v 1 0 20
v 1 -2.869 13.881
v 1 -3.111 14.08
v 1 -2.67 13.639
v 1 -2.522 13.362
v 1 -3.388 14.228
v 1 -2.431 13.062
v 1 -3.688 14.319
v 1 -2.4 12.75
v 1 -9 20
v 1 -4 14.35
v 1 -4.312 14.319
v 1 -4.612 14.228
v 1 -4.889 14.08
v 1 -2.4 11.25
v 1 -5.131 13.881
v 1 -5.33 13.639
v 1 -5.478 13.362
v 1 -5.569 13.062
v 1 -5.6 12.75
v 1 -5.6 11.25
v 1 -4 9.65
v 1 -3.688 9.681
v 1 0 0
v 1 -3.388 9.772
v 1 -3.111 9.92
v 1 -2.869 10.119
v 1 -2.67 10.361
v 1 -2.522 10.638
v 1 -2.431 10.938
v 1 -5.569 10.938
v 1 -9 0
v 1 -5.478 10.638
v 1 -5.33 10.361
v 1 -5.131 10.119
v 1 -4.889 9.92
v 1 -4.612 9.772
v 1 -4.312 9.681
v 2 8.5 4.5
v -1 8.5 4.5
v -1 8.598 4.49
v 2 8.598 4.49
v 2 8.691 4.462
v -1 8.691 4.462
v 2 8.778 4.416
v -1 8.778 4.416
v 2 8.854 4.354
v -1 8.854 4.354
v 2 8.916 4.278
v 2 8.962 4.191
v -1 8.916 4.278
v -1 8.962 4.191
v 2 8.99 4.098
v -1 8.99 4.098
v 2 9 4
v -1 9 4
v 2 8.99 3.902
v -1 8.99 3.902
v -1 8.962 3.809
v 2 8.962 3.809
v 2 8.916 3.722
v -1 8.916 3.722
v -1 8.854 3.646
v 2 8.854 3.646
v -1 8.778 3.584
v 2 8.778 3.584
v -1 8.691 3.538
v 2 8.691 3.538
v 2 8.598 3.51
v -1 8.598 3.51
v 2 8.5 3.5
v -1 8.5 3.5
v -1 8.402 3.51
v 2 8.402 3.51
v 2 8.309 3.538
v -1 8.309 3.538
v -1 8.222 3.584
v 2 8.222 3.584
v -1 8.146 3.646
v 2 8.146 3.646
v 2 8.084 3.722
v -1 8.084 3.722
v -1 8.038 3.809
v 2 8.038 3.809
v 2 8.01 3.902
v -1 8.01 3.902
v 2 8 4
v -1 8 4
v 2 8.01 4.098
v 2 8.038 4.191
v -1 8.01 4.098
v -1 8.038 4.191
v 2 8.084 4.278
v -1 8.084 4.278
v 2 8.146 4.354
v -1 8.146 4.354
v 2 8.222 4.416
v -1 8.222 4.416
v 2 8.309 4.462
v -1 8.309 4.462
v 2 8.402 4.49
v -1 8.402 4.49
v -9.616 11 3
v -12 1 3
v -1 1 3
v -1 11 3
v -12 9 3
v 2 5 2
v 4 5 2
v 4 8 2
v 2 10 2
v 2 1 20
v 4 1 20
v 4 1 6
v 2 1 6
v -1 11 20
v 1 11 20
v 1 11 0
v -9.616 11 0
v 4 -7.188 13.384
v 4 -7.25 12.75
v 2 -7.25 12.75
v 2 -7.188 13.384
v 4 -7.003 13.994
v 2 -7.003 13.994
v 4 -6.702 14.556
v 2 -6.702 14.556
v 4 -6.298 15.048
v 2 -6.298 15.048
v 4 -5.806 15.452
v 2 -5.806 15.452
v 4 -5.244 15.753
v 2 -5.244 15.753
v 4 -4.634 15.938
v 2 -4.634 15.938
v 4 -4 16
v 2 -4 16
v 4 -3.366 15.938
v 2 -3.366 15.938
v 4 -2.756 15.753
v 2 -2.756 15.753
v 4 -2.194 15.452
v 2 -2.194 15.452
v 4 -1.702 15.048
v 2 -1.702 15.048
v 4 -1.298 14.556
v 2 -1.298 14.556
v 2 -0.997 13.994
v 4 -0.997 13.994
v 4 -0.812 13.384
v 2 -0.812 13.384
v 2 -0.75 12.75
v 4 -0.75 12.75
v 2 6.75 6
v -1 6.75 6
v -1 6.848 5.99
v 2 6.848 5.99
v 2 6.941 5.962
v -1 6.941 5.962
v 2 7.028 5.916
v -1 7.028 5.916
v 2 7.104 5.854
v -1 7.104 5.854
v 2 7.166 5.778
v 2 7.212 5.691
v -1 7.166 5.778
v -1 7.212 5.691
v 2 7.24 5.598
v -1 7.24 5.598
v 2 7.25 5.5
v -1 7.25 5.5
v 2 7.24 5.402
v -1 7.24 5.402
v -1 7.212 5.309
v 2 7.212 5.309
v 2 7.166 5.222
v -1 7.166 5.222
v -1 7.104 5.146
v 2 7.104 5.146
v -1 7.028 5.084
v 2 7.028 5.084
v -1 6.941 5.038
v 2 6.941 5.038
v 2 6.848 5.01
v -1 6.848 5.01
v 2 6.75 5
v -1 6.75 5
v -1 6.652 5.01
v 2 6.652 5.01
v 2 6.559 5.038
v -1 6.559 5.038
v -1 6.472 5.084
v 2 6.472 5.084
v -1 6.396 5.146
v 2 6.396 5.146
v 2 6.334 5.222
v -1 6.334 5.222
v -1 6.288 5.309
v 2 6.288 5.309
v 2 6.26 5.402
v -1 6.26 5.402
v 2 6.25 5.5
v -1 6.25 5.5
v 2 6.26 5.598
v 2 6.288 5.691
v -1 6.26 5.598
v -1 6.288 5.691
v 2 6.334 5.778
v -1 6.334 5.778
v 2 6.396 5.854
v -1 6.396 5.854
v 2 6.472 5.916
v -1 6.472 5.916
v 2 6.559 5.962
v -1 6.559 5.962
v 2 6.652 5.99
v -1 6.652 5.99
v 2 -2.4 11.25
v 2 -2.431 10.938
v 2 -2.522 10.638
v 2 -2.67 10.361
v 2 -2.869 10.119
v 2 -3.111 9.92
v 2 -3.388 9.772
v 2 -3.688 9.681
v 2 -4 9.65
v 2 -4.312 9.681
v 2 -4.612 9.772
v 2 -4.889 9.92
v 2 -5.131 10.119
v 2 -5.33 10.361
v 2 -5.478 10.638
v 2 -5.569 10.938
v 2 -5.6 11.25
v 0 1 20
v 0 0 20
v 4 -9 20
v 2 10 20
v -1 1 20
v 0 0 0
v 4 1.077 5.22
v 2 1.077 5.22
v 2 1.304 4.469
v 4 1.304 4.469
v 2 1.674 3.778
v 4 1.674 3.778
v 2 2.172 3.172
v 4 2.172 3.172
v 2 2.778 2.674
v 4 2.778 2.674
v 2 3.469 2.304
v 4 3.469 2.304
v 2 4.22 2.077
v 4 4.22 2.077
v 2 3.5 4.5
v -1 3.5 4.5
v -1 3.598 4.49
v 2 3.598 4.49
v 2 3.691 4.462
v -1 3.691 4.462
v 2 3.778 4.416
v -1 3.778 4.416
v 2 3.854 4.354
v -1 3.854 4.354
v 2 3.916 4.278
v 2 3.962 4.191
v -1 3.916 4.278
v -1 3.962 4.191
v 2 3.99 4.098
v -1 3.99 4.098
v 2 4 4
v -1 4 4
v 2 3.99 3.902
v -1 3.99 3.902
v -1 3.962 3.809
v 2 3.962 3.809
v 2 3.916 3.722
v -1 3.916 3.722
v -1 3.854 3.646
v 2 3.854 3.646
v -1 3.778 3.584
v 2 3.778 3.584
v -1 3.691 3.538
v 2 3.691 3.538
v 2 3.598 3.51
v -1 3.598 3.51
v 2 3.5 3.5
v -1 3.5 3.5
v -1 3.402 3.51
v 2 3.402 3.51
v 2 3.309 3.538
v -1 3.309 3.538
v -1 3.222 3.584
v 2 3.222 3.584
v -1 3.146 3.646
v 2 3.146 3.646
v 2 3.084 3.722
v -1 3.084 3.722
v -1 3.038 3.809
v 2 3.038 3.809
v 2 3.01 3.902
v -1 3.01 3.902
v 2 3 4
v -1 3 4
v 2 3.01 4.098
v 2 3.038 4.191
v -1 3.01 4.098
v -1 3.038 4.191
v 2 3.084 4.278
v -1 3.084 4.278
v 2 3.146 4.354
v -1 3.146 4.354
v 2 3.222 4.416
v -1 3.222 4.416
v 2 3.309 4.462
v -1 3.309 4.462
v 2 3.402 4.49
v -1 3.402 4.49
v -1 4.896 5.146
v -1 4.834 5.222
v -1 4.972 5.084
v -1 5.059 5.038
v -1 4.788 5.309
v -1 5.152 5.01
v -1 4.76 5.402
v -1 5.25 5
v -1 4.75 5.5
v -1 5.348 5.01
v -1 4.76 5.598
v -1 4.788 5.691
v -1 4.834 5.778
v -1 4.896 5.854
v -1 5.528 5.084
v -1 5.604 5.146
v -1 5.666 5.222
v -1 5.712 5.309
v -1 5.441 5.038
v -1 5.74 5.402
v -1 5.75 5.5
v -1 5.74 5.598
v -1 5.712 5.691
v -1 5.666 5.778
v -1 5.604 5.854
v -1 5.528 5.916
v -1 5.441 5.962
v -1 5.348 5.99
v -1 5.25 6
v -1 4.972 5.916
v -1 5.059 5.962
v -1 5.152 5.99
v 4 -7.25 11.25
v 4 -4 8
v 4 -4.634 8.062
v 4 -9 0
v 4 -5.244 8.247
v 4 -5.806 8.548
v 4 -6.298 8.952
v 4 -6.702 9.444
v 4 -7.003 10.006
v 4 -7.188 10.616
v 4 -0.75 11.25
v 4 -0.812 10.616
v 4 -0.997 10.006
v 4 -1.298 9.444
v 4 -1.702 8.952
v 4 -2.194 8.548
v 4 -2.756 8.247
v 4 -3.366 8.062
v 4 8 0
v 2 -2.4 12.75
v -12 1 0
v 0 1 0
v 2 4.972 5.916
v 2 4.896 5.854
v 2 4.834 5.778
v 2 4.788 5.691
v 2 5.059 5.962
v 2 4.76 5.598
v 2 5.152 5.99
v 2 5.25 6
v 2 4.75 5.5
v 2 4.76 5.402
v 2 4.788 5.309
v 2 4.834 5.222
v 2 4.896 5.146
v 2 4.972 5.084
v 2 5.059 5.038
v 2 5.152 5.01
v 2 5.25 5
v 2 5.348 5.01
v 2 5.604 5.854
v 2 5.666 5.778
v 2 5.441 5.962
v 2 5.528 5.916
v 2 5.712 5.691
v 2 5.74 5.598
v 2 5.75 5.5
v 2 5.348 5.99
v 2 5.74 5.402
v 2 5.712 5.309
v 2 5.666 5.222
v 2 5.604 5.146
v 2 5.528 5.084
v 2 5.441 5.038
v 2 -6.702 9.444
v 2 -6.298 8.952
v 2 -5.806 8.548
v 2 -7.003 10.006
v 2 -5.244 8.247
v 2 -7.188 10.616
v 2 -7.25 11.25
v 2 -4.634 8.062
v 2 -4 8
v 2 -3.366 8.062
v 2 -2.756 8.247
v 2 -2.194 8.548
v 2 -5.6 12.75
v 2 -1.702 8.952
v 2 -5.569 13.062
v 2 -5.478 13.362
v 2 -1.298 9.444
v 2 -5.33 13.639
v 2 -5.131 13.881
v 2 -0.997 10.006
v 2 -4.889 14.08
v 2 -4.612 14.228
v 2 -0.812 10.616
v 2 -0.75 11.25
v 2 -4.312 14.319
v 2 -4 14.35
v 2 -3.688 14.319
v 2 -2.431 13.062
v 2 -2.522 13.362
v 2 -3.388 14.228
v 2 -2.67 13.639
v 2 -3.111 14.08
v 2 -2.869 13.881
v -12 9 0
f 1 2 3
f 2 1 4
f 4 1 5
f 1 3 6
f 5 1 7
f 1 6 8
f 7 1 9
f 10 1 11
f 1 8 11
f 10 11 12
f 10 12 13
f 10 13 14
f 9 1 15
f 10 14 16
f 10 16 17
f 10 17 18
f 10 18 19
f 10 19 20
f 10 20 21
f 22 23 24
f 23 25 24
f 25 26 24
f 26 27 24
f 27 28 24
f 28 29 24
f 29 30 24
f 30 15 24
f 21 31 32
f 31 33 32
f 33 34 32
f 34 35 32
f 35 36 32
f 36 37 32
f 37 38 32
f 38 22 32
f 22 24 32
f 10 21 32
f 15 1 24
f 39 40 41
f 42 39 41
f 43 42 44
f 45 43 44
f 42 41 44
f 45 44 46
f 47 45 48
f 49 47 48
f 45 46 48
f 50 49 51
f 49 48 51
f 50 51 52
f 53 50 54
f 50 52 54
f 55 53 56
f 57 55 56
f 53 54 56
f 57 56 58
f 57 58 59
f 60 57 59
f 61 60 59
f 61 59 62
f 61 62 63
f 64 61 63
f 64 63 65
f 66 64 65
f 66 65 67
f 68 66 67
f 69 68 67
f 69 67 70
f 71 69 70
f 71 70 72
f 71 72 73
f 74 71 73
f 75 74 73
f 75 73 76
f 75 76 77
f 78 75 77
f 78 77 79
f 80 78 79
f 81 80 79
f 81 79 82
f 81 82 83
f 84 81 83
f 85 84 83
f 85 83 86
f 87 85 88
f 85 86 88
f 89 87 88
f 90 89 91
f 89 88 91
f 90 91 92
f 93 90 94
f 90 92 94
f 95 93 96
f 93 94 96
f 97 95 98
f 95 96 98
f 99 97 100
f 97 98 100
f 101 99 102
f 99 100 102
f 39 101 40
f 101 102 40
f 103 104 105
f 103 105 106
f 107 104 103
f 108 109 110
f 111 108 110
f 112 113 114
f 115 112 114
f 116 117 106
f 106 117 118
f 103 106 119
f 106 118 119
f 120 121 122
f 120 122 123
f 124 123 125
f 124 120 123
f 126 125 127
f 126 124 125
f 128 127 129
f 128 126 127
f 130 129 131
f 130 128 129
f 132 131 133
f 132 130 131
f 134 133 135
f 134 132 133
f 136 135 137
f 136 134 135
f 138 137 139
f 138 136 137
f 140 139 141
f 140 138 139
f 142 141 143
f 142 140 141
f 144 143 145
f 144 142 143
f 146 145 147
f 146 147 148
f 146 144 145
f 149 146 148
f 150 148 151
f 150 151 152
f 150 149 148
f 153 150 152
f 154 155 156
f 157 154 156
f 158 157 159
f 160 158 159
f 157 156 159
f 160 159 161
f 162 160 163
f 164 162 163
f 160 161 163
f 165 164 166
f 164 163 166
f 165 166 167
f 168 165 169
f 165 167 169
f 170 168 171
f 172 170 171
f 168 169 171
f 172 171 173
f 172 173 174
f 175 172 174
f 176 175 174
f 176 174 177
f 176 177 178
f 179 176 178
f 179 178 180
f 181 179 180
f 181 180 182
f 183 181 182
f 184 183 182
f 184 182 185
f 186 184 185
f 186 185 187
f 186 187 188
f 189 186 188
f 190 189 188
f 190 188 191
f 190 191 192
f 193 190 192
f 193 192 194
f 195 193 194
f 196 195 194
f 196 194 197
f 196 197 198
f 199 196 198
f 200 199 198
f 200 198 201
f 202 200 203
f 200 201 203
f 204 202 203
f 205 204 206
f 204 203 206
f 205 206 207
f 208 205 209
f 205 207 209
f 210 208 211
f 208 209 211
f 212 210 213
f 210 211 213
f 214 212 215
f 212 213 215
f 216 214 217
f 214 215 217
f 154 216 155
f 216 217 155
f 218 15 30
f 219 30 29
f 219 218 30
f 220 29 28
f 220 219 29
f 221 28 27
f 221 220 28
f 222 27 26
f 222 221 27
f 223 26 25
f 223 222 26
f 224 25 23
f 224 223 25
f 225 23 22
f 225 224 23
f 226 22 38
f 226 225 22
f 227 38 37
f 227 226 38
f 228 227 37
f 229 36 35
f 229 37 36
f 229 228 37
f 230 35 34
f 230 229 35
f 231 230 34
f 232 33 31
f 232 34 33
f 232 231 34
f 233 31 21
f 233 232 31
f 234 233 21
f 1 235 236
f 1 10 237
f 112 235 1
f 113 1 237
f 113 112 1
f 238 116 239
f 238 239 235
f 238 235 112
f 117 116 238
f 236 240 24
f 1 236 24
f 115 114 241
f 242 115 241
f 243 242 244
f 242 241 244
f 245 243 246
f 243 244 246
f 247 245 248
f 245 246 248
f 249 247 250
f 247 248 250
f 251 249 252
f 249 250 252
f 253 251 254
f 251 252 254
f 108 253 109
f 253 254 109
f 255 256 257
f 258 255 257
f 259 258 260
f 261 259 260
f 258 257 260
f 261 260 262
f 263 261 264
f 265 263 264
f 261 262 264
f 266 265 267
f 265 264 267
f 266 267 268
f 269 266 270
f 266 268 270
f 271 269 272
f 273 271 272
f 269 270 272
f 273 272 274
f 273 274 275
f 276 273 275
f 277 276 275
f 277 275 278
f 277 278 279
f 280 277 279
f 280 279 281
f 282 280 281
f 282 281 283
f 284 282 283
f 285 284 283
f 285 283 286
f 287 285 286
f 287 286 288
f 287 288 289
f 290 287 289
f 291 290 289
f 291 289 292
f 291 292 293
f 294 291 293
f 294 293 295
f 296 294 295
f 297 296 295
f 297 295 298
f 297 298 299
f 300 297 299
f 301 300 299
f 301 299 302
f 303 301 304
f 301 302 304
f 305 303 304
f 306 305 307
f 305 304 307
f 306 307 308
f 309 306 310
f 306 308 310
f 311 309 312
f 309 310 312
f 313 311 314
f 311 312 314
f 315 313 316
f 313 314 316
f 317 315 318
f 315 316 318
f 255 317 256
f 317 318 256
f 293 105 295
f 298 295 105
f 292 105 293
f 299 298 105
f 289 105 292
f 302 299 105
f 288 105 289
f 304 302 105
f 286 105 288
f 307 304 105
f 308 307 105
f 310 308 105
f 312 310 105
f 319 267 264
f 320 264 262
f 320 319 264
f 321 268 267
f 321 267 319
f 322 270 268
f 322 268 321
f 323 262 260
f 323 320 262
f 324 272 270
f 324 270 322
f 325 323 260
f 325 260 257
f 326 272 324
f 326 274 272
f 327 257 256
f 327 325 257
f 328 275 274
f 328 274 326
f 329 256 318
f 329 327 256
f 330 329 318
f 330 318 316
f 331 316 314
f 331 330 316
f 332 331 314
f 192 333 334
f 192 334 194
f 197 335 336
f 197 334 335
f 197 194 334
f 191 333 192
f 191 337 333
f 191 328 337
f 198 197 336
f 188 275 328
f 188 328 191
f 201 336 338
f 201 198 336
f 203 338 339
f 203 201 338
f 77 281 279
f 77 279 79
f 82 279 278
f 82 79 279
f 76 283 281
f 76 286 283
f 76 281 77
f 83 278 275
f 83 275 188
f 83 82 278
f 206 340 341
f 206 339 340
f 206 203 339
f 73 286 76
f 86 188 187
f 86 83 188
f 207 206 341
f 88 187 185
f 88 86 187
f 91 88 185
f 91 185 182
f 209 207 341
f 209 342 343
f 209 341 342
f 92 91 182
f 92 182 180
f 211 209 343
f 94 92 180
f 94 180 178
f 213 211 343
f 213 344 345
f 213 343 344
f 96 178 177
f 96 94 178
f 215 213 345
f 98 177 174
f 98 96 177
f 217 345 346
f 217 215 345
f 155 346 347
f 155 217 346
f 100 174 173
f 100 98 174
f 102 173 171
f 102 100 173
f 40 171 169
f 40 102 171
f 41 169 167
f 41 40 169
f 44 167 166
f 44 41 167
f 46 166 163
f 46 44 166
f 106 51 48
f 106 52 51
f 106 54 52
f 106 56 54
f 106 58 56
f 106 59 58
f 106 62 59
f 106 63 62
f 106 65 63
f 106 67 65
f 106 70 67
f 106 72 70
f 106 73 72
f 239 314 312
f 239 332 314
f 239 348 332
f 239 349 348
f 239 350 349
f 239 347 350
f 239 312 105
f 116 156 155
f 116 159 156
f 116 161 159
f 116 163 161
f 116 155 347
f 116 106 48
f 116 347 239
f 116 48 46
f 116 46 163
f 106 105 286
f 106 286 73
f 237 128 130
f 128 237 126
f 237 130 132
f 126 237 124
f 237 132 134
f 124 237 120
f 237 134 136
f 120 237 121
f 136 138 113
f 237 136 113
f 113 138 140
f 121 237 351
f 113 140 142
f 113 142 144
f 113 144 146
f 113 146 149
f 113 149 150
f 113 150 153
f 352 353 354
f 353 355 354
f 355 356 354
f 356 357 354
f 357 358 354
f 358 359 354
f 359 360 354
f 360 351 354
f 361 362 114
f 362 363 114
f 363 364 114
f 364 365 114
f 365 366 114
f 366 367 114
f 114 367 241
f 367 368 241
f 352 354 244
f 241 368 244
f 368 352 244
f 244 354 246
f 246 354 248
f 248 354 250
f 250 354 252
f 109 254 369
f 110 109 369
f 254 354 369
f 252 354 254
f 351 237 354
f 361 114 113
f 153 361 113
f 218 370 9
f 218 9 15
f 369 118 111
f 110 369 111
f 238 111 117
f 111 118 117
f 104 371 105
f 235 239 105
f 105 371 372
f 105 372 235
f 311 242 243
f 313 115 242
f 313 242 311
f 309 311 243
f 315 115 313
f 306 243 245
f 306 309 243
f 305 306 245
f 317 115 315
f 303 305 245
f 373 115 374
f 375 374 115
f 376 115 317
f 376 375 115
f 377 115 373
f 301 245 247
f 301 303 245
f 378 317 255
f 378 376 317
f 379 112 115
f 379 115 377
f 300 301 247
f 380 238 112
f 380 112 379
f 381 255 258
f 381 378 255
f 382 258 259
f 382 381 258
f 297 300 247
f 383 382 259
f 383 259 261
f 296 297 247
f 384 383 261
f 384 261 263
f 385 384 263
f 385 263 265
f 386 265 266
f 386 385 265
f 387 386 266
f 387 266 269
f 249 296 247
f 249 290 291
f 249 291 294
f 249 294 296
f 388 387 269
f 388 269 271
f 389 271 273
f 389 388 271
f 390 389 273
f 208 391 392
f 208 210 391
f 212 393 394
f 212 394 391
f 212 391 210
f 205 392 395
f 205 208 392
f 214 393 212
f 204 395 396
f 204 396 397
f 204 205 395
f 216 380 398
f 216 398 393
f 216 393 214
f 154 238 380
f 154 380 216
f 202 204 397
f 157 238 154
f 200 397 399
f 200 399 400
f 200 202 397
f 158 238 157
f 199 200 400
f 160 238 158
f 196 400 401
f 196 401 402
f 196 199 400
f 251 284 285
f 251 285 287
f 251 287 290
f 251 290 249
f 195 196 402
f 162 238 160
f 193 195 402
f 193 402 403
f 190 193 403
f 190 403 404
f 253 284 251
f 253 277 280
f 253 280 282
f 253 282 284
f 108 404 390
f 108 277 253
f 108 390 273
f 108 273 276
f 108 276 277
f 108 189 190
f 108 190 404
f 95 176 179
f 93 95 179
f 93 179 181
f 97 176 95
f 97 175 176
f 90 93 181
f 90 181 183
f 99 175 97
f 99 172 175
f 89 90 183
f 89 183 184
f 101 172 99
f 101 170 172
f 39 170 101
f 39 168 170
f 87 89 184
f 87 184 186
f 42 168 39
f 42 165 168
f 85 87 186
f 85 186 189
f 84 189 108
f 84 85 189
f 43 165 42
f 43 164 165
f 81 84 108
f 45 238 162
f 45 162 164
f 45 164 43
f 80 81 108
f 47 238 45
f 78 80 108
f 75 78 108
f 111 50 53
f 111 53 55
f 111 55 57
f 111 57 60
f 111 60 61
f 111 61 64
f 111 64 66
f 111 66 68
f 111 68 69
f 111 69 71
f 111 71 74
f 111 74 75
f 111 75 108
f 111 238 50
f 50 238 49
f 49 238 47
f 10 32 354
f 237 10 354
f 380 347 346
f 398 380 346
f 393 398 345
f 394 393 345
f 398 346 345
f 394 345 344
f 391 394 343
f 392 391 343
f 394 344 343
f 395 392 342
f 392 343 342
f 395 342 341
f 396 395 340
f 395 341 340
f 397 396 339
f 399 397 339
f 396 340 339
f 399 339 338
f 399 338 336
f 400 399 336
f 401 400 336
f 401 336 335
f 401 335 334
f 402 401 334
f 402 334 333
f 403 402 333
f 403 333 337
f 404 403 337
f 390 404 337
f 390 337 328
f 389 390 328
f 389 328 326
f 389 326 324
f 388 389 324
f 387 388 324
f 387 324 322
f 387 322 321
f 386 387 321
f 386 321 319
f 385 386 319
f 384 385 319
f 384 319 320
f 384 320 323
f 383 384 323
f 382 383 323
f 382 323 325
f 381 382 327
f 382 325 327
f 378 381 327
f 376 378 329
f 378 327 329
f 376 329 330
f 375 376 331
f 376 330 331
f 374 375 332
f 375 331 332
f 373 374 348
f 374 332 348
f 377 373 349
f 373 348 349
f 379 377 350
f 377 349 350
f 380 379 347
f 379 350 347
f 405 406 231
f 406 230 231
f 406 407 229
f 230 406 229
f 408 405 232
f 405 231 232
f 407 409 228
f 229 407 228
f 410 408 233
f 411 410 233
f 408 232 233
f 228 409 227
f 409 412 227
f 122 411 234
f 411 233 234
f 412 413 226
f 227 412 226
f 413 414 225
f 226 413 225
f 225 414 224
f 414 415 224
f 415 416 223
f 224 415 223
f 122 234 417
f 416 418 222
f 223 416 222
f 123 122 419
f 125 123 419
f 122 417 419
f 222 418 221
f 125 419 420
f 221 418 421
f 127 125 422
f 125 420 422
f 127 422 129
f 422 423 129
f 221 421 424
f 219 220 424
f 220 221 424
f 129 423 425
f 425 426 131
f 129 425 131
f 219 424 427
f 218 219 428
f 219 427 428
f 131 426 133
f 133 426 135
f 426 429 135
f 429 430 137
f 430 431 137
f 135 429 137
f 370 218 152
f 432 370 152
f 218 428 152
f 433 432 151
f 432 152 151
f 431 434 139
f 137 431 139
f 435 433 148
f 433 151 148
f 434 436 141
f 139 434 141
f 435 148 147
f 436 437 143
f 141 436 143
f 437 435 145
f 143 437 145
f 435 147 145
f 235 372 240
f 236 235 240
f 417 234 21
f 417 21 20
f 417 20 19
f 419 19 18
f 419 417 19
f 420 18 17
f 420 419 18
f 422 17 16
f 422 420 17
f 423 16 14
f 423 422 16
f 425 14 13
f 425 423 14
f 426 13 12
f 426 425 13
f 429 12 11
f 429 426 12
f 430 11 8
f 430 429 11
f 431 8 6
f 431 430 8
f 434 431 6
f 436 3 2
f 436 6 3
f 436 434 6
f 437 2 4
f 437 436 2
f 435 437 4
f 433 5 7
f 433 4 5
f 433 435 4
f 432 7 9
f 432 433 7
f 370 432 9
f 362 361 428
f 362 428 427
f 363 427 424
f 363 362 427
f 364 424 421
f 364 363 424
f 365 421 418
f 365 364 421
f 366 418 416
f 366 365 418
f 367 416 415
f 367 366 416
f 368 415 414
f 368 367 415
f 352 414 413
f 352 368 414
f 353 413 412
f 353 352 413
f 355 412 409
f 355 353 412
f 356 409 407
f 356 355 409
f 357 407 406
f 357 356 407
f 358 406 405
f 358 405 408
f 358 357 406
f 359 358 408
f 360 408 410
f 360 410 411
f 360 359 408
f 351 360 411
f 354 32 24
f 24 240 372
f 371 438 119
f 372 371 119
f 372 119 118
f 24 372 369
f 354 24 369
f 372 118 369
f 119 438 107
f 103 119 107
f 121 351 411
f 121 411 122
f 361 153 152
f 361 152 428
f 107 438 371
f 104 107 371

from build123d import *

# Parameters (mm, degrees)
EXTRUDE_1_DEPTH     = 20
SKETCH_2_W          = 17
SKETCH_2_H          = 10
CUT_EXTRUDE_1_DEPTH = 11
CUT_EXTRUDE_2_REACH = 18
CHAMFER_1_SIZE      = 3
CHAMFER_2_SIZE      = 2
CHAMFER_2_SIZE2     = 2.383507185
CUT_EXTRUDE_3_DEPTH = 2
CUT_EXTRUDE_4_DEPTH = 2
SKETCH_5_R          = 0.5
CUT_EXTRUDE_5_DEPTH = 6


with BuildPart() as part:
    # Эскиз1 → Бобышка-Вытянуть1 (new body)
    with BuildSketch(Plane.XY):
        Polygon((0, 0), (1, 0), (1, -9), (4, -9), (4, 11), (-12, 11), (-12, 1), (0, 1), align=None)
    extrude(amount=EXTRUDE_1_DEPTH)

    # Эскиз2 → Вырез-Вытянуть1 (cut)
    with BuildSketch(Plane.ZY.offset(12)):
        with Locations((11.5, 6)):
            Rectangle(SKETCH_2_W, SKETCH_2_H)
    extrude(amount=-CUT_EXTRUDE_1_DEPTH, mode=Mode.SUBTRACT)

    # Эскиз3 → Вырез-Вытянуть2 (cut, up to next)
    with BuildSketch(Plane(origin=(4, 0, 0), x_dir=(0, 0, -1), z_dir=(1, 0, 0)), mode=Mode.PRIVATE) as cut_extrude_2_sk1:
        with BuildLine():
            Line((-12.75, -2.4), (-11.25, -2.4))
            ThreePointArc((-11.25, -2.4), (-9.65, -4), (-11.25, -5.6))
            Line((-11.25, -5.6), (-12.75, -5.6))
            ThreePointArc((-12.75, -5.6), (-14.35, -4), (-12.75, -2.4))
        make_face()
    cut_extrude_2_tool1 = extrude(cut_extrude_2_sk1.sketch, amount=-CUT_EXTRUDE_2_REACH, mode=Mode.PRIVATE) & part.part
    add(cut_extrude_2_tool1.solids().sort_by_distance((4, -4, 12))[0], mode=Mode.SUBTRACT)

    # Фаска1
    chamfer_1_edges = [part.edges().sort_by_distance(p)[0] for p in [
        (4, 11, 10),
    ]]
    chamfer(chamfer_1_edges, length=CHAMFER_1_SIZE)

    # Фаска2
    chamfer_2_edges = [part.edges().sort_by_distance(p)[0] for p in [
        (-12, 11, 1.5),
    ]]
    chamfer_2_side = [part.faces().sort_by_distance(p)[0] for p in [
        (-12, 6, 1.5),
    ]]
    chamfer(chamfer_2_edges, length=CHAMFER_2_SIZE, length2=CHAMFER_2_SIZE2, reference=chamfer_2_side[0])

    # Эскиз3<3> → Вырез-Вытянуть3 (cut)
    with BuildSketch(Plane(origin=(4, 0, 0), x_dir=(0, 0, -1), z_dir=(1, 0, 0))):
        with BuildLine():
            Line((-12.75, -0.75), (-11.25, -0.75))
            ThreePointArc((-11.25, -0.75), (-8, -4), (-11.25, -7.25))
            Line((-11.25, -7.25), (-12.75, -7.25))
            ThreePointArc((-12.75, -7.25), (-16, -4), (-12.75, -0.75))
        make_face()
        with BuildLine():
            Line((-12.75, -2.4), (-11.25, -2.4))
            ThreePointArc((-11.25, -2.4), (-9.65, -4), (-11.25, -5.6))
            Line((-11.25, -5.6), (-12.75, -5.6))
            ThreePointArc((-12.75, -5.6), (-14.35, -4), (-12.75, -2.4))
        make_face(mode=Mode.SUBTRACT)
    extrude(amount=-CUT_EXTRUDE_3_DEPTH, mode=Mode.SUBTRACT)

    # Эскиз4 → Вырез-Вытянуть4 (cut)
    with BuildSketch(Plane(origin=(4, 0, 0), x_dir=(0, 0, -1), z_dir=(1, 0, 0))):
        with BuildLine():
            Line((-20, 1), (-6, 1))
            ThreePointArc((-6, 1), (-3.171572875, 2.171572875), (-2, 5))
            Line((-2, 5), (-2, 11))
            Line((-2, 11), (-20, 11))
            Line((-20, 11), (-20, 10))
            Line((-20, 10), (-20, 1))
        make_face()
    extrude(amount=-CUT_EXTRUDE_4_DEPTH, mode=Mode.SUBTRACT)

    # Эскиз5 → Вырез-Вытянуть5 (cut, through all)
    with BuildSketch(Plane.ZY.offset(1)):
        with Locations((4, 8.5)):
            Circle(SKETCH_5_R)
        with Locations((5.5, 6.75)):
            Circle(SKETCH_5_R)
        with Locations((5.5, 5.25)):
            Circle(SKETCH_5_R)
        with Locations((4, 3.5)):
            Circle(SKETCH_5_R)
    extrude(amount=-CUT_EXTRUDE_5_DEPTH, mode=Mode.SUBTRACT)


solid = part.part
